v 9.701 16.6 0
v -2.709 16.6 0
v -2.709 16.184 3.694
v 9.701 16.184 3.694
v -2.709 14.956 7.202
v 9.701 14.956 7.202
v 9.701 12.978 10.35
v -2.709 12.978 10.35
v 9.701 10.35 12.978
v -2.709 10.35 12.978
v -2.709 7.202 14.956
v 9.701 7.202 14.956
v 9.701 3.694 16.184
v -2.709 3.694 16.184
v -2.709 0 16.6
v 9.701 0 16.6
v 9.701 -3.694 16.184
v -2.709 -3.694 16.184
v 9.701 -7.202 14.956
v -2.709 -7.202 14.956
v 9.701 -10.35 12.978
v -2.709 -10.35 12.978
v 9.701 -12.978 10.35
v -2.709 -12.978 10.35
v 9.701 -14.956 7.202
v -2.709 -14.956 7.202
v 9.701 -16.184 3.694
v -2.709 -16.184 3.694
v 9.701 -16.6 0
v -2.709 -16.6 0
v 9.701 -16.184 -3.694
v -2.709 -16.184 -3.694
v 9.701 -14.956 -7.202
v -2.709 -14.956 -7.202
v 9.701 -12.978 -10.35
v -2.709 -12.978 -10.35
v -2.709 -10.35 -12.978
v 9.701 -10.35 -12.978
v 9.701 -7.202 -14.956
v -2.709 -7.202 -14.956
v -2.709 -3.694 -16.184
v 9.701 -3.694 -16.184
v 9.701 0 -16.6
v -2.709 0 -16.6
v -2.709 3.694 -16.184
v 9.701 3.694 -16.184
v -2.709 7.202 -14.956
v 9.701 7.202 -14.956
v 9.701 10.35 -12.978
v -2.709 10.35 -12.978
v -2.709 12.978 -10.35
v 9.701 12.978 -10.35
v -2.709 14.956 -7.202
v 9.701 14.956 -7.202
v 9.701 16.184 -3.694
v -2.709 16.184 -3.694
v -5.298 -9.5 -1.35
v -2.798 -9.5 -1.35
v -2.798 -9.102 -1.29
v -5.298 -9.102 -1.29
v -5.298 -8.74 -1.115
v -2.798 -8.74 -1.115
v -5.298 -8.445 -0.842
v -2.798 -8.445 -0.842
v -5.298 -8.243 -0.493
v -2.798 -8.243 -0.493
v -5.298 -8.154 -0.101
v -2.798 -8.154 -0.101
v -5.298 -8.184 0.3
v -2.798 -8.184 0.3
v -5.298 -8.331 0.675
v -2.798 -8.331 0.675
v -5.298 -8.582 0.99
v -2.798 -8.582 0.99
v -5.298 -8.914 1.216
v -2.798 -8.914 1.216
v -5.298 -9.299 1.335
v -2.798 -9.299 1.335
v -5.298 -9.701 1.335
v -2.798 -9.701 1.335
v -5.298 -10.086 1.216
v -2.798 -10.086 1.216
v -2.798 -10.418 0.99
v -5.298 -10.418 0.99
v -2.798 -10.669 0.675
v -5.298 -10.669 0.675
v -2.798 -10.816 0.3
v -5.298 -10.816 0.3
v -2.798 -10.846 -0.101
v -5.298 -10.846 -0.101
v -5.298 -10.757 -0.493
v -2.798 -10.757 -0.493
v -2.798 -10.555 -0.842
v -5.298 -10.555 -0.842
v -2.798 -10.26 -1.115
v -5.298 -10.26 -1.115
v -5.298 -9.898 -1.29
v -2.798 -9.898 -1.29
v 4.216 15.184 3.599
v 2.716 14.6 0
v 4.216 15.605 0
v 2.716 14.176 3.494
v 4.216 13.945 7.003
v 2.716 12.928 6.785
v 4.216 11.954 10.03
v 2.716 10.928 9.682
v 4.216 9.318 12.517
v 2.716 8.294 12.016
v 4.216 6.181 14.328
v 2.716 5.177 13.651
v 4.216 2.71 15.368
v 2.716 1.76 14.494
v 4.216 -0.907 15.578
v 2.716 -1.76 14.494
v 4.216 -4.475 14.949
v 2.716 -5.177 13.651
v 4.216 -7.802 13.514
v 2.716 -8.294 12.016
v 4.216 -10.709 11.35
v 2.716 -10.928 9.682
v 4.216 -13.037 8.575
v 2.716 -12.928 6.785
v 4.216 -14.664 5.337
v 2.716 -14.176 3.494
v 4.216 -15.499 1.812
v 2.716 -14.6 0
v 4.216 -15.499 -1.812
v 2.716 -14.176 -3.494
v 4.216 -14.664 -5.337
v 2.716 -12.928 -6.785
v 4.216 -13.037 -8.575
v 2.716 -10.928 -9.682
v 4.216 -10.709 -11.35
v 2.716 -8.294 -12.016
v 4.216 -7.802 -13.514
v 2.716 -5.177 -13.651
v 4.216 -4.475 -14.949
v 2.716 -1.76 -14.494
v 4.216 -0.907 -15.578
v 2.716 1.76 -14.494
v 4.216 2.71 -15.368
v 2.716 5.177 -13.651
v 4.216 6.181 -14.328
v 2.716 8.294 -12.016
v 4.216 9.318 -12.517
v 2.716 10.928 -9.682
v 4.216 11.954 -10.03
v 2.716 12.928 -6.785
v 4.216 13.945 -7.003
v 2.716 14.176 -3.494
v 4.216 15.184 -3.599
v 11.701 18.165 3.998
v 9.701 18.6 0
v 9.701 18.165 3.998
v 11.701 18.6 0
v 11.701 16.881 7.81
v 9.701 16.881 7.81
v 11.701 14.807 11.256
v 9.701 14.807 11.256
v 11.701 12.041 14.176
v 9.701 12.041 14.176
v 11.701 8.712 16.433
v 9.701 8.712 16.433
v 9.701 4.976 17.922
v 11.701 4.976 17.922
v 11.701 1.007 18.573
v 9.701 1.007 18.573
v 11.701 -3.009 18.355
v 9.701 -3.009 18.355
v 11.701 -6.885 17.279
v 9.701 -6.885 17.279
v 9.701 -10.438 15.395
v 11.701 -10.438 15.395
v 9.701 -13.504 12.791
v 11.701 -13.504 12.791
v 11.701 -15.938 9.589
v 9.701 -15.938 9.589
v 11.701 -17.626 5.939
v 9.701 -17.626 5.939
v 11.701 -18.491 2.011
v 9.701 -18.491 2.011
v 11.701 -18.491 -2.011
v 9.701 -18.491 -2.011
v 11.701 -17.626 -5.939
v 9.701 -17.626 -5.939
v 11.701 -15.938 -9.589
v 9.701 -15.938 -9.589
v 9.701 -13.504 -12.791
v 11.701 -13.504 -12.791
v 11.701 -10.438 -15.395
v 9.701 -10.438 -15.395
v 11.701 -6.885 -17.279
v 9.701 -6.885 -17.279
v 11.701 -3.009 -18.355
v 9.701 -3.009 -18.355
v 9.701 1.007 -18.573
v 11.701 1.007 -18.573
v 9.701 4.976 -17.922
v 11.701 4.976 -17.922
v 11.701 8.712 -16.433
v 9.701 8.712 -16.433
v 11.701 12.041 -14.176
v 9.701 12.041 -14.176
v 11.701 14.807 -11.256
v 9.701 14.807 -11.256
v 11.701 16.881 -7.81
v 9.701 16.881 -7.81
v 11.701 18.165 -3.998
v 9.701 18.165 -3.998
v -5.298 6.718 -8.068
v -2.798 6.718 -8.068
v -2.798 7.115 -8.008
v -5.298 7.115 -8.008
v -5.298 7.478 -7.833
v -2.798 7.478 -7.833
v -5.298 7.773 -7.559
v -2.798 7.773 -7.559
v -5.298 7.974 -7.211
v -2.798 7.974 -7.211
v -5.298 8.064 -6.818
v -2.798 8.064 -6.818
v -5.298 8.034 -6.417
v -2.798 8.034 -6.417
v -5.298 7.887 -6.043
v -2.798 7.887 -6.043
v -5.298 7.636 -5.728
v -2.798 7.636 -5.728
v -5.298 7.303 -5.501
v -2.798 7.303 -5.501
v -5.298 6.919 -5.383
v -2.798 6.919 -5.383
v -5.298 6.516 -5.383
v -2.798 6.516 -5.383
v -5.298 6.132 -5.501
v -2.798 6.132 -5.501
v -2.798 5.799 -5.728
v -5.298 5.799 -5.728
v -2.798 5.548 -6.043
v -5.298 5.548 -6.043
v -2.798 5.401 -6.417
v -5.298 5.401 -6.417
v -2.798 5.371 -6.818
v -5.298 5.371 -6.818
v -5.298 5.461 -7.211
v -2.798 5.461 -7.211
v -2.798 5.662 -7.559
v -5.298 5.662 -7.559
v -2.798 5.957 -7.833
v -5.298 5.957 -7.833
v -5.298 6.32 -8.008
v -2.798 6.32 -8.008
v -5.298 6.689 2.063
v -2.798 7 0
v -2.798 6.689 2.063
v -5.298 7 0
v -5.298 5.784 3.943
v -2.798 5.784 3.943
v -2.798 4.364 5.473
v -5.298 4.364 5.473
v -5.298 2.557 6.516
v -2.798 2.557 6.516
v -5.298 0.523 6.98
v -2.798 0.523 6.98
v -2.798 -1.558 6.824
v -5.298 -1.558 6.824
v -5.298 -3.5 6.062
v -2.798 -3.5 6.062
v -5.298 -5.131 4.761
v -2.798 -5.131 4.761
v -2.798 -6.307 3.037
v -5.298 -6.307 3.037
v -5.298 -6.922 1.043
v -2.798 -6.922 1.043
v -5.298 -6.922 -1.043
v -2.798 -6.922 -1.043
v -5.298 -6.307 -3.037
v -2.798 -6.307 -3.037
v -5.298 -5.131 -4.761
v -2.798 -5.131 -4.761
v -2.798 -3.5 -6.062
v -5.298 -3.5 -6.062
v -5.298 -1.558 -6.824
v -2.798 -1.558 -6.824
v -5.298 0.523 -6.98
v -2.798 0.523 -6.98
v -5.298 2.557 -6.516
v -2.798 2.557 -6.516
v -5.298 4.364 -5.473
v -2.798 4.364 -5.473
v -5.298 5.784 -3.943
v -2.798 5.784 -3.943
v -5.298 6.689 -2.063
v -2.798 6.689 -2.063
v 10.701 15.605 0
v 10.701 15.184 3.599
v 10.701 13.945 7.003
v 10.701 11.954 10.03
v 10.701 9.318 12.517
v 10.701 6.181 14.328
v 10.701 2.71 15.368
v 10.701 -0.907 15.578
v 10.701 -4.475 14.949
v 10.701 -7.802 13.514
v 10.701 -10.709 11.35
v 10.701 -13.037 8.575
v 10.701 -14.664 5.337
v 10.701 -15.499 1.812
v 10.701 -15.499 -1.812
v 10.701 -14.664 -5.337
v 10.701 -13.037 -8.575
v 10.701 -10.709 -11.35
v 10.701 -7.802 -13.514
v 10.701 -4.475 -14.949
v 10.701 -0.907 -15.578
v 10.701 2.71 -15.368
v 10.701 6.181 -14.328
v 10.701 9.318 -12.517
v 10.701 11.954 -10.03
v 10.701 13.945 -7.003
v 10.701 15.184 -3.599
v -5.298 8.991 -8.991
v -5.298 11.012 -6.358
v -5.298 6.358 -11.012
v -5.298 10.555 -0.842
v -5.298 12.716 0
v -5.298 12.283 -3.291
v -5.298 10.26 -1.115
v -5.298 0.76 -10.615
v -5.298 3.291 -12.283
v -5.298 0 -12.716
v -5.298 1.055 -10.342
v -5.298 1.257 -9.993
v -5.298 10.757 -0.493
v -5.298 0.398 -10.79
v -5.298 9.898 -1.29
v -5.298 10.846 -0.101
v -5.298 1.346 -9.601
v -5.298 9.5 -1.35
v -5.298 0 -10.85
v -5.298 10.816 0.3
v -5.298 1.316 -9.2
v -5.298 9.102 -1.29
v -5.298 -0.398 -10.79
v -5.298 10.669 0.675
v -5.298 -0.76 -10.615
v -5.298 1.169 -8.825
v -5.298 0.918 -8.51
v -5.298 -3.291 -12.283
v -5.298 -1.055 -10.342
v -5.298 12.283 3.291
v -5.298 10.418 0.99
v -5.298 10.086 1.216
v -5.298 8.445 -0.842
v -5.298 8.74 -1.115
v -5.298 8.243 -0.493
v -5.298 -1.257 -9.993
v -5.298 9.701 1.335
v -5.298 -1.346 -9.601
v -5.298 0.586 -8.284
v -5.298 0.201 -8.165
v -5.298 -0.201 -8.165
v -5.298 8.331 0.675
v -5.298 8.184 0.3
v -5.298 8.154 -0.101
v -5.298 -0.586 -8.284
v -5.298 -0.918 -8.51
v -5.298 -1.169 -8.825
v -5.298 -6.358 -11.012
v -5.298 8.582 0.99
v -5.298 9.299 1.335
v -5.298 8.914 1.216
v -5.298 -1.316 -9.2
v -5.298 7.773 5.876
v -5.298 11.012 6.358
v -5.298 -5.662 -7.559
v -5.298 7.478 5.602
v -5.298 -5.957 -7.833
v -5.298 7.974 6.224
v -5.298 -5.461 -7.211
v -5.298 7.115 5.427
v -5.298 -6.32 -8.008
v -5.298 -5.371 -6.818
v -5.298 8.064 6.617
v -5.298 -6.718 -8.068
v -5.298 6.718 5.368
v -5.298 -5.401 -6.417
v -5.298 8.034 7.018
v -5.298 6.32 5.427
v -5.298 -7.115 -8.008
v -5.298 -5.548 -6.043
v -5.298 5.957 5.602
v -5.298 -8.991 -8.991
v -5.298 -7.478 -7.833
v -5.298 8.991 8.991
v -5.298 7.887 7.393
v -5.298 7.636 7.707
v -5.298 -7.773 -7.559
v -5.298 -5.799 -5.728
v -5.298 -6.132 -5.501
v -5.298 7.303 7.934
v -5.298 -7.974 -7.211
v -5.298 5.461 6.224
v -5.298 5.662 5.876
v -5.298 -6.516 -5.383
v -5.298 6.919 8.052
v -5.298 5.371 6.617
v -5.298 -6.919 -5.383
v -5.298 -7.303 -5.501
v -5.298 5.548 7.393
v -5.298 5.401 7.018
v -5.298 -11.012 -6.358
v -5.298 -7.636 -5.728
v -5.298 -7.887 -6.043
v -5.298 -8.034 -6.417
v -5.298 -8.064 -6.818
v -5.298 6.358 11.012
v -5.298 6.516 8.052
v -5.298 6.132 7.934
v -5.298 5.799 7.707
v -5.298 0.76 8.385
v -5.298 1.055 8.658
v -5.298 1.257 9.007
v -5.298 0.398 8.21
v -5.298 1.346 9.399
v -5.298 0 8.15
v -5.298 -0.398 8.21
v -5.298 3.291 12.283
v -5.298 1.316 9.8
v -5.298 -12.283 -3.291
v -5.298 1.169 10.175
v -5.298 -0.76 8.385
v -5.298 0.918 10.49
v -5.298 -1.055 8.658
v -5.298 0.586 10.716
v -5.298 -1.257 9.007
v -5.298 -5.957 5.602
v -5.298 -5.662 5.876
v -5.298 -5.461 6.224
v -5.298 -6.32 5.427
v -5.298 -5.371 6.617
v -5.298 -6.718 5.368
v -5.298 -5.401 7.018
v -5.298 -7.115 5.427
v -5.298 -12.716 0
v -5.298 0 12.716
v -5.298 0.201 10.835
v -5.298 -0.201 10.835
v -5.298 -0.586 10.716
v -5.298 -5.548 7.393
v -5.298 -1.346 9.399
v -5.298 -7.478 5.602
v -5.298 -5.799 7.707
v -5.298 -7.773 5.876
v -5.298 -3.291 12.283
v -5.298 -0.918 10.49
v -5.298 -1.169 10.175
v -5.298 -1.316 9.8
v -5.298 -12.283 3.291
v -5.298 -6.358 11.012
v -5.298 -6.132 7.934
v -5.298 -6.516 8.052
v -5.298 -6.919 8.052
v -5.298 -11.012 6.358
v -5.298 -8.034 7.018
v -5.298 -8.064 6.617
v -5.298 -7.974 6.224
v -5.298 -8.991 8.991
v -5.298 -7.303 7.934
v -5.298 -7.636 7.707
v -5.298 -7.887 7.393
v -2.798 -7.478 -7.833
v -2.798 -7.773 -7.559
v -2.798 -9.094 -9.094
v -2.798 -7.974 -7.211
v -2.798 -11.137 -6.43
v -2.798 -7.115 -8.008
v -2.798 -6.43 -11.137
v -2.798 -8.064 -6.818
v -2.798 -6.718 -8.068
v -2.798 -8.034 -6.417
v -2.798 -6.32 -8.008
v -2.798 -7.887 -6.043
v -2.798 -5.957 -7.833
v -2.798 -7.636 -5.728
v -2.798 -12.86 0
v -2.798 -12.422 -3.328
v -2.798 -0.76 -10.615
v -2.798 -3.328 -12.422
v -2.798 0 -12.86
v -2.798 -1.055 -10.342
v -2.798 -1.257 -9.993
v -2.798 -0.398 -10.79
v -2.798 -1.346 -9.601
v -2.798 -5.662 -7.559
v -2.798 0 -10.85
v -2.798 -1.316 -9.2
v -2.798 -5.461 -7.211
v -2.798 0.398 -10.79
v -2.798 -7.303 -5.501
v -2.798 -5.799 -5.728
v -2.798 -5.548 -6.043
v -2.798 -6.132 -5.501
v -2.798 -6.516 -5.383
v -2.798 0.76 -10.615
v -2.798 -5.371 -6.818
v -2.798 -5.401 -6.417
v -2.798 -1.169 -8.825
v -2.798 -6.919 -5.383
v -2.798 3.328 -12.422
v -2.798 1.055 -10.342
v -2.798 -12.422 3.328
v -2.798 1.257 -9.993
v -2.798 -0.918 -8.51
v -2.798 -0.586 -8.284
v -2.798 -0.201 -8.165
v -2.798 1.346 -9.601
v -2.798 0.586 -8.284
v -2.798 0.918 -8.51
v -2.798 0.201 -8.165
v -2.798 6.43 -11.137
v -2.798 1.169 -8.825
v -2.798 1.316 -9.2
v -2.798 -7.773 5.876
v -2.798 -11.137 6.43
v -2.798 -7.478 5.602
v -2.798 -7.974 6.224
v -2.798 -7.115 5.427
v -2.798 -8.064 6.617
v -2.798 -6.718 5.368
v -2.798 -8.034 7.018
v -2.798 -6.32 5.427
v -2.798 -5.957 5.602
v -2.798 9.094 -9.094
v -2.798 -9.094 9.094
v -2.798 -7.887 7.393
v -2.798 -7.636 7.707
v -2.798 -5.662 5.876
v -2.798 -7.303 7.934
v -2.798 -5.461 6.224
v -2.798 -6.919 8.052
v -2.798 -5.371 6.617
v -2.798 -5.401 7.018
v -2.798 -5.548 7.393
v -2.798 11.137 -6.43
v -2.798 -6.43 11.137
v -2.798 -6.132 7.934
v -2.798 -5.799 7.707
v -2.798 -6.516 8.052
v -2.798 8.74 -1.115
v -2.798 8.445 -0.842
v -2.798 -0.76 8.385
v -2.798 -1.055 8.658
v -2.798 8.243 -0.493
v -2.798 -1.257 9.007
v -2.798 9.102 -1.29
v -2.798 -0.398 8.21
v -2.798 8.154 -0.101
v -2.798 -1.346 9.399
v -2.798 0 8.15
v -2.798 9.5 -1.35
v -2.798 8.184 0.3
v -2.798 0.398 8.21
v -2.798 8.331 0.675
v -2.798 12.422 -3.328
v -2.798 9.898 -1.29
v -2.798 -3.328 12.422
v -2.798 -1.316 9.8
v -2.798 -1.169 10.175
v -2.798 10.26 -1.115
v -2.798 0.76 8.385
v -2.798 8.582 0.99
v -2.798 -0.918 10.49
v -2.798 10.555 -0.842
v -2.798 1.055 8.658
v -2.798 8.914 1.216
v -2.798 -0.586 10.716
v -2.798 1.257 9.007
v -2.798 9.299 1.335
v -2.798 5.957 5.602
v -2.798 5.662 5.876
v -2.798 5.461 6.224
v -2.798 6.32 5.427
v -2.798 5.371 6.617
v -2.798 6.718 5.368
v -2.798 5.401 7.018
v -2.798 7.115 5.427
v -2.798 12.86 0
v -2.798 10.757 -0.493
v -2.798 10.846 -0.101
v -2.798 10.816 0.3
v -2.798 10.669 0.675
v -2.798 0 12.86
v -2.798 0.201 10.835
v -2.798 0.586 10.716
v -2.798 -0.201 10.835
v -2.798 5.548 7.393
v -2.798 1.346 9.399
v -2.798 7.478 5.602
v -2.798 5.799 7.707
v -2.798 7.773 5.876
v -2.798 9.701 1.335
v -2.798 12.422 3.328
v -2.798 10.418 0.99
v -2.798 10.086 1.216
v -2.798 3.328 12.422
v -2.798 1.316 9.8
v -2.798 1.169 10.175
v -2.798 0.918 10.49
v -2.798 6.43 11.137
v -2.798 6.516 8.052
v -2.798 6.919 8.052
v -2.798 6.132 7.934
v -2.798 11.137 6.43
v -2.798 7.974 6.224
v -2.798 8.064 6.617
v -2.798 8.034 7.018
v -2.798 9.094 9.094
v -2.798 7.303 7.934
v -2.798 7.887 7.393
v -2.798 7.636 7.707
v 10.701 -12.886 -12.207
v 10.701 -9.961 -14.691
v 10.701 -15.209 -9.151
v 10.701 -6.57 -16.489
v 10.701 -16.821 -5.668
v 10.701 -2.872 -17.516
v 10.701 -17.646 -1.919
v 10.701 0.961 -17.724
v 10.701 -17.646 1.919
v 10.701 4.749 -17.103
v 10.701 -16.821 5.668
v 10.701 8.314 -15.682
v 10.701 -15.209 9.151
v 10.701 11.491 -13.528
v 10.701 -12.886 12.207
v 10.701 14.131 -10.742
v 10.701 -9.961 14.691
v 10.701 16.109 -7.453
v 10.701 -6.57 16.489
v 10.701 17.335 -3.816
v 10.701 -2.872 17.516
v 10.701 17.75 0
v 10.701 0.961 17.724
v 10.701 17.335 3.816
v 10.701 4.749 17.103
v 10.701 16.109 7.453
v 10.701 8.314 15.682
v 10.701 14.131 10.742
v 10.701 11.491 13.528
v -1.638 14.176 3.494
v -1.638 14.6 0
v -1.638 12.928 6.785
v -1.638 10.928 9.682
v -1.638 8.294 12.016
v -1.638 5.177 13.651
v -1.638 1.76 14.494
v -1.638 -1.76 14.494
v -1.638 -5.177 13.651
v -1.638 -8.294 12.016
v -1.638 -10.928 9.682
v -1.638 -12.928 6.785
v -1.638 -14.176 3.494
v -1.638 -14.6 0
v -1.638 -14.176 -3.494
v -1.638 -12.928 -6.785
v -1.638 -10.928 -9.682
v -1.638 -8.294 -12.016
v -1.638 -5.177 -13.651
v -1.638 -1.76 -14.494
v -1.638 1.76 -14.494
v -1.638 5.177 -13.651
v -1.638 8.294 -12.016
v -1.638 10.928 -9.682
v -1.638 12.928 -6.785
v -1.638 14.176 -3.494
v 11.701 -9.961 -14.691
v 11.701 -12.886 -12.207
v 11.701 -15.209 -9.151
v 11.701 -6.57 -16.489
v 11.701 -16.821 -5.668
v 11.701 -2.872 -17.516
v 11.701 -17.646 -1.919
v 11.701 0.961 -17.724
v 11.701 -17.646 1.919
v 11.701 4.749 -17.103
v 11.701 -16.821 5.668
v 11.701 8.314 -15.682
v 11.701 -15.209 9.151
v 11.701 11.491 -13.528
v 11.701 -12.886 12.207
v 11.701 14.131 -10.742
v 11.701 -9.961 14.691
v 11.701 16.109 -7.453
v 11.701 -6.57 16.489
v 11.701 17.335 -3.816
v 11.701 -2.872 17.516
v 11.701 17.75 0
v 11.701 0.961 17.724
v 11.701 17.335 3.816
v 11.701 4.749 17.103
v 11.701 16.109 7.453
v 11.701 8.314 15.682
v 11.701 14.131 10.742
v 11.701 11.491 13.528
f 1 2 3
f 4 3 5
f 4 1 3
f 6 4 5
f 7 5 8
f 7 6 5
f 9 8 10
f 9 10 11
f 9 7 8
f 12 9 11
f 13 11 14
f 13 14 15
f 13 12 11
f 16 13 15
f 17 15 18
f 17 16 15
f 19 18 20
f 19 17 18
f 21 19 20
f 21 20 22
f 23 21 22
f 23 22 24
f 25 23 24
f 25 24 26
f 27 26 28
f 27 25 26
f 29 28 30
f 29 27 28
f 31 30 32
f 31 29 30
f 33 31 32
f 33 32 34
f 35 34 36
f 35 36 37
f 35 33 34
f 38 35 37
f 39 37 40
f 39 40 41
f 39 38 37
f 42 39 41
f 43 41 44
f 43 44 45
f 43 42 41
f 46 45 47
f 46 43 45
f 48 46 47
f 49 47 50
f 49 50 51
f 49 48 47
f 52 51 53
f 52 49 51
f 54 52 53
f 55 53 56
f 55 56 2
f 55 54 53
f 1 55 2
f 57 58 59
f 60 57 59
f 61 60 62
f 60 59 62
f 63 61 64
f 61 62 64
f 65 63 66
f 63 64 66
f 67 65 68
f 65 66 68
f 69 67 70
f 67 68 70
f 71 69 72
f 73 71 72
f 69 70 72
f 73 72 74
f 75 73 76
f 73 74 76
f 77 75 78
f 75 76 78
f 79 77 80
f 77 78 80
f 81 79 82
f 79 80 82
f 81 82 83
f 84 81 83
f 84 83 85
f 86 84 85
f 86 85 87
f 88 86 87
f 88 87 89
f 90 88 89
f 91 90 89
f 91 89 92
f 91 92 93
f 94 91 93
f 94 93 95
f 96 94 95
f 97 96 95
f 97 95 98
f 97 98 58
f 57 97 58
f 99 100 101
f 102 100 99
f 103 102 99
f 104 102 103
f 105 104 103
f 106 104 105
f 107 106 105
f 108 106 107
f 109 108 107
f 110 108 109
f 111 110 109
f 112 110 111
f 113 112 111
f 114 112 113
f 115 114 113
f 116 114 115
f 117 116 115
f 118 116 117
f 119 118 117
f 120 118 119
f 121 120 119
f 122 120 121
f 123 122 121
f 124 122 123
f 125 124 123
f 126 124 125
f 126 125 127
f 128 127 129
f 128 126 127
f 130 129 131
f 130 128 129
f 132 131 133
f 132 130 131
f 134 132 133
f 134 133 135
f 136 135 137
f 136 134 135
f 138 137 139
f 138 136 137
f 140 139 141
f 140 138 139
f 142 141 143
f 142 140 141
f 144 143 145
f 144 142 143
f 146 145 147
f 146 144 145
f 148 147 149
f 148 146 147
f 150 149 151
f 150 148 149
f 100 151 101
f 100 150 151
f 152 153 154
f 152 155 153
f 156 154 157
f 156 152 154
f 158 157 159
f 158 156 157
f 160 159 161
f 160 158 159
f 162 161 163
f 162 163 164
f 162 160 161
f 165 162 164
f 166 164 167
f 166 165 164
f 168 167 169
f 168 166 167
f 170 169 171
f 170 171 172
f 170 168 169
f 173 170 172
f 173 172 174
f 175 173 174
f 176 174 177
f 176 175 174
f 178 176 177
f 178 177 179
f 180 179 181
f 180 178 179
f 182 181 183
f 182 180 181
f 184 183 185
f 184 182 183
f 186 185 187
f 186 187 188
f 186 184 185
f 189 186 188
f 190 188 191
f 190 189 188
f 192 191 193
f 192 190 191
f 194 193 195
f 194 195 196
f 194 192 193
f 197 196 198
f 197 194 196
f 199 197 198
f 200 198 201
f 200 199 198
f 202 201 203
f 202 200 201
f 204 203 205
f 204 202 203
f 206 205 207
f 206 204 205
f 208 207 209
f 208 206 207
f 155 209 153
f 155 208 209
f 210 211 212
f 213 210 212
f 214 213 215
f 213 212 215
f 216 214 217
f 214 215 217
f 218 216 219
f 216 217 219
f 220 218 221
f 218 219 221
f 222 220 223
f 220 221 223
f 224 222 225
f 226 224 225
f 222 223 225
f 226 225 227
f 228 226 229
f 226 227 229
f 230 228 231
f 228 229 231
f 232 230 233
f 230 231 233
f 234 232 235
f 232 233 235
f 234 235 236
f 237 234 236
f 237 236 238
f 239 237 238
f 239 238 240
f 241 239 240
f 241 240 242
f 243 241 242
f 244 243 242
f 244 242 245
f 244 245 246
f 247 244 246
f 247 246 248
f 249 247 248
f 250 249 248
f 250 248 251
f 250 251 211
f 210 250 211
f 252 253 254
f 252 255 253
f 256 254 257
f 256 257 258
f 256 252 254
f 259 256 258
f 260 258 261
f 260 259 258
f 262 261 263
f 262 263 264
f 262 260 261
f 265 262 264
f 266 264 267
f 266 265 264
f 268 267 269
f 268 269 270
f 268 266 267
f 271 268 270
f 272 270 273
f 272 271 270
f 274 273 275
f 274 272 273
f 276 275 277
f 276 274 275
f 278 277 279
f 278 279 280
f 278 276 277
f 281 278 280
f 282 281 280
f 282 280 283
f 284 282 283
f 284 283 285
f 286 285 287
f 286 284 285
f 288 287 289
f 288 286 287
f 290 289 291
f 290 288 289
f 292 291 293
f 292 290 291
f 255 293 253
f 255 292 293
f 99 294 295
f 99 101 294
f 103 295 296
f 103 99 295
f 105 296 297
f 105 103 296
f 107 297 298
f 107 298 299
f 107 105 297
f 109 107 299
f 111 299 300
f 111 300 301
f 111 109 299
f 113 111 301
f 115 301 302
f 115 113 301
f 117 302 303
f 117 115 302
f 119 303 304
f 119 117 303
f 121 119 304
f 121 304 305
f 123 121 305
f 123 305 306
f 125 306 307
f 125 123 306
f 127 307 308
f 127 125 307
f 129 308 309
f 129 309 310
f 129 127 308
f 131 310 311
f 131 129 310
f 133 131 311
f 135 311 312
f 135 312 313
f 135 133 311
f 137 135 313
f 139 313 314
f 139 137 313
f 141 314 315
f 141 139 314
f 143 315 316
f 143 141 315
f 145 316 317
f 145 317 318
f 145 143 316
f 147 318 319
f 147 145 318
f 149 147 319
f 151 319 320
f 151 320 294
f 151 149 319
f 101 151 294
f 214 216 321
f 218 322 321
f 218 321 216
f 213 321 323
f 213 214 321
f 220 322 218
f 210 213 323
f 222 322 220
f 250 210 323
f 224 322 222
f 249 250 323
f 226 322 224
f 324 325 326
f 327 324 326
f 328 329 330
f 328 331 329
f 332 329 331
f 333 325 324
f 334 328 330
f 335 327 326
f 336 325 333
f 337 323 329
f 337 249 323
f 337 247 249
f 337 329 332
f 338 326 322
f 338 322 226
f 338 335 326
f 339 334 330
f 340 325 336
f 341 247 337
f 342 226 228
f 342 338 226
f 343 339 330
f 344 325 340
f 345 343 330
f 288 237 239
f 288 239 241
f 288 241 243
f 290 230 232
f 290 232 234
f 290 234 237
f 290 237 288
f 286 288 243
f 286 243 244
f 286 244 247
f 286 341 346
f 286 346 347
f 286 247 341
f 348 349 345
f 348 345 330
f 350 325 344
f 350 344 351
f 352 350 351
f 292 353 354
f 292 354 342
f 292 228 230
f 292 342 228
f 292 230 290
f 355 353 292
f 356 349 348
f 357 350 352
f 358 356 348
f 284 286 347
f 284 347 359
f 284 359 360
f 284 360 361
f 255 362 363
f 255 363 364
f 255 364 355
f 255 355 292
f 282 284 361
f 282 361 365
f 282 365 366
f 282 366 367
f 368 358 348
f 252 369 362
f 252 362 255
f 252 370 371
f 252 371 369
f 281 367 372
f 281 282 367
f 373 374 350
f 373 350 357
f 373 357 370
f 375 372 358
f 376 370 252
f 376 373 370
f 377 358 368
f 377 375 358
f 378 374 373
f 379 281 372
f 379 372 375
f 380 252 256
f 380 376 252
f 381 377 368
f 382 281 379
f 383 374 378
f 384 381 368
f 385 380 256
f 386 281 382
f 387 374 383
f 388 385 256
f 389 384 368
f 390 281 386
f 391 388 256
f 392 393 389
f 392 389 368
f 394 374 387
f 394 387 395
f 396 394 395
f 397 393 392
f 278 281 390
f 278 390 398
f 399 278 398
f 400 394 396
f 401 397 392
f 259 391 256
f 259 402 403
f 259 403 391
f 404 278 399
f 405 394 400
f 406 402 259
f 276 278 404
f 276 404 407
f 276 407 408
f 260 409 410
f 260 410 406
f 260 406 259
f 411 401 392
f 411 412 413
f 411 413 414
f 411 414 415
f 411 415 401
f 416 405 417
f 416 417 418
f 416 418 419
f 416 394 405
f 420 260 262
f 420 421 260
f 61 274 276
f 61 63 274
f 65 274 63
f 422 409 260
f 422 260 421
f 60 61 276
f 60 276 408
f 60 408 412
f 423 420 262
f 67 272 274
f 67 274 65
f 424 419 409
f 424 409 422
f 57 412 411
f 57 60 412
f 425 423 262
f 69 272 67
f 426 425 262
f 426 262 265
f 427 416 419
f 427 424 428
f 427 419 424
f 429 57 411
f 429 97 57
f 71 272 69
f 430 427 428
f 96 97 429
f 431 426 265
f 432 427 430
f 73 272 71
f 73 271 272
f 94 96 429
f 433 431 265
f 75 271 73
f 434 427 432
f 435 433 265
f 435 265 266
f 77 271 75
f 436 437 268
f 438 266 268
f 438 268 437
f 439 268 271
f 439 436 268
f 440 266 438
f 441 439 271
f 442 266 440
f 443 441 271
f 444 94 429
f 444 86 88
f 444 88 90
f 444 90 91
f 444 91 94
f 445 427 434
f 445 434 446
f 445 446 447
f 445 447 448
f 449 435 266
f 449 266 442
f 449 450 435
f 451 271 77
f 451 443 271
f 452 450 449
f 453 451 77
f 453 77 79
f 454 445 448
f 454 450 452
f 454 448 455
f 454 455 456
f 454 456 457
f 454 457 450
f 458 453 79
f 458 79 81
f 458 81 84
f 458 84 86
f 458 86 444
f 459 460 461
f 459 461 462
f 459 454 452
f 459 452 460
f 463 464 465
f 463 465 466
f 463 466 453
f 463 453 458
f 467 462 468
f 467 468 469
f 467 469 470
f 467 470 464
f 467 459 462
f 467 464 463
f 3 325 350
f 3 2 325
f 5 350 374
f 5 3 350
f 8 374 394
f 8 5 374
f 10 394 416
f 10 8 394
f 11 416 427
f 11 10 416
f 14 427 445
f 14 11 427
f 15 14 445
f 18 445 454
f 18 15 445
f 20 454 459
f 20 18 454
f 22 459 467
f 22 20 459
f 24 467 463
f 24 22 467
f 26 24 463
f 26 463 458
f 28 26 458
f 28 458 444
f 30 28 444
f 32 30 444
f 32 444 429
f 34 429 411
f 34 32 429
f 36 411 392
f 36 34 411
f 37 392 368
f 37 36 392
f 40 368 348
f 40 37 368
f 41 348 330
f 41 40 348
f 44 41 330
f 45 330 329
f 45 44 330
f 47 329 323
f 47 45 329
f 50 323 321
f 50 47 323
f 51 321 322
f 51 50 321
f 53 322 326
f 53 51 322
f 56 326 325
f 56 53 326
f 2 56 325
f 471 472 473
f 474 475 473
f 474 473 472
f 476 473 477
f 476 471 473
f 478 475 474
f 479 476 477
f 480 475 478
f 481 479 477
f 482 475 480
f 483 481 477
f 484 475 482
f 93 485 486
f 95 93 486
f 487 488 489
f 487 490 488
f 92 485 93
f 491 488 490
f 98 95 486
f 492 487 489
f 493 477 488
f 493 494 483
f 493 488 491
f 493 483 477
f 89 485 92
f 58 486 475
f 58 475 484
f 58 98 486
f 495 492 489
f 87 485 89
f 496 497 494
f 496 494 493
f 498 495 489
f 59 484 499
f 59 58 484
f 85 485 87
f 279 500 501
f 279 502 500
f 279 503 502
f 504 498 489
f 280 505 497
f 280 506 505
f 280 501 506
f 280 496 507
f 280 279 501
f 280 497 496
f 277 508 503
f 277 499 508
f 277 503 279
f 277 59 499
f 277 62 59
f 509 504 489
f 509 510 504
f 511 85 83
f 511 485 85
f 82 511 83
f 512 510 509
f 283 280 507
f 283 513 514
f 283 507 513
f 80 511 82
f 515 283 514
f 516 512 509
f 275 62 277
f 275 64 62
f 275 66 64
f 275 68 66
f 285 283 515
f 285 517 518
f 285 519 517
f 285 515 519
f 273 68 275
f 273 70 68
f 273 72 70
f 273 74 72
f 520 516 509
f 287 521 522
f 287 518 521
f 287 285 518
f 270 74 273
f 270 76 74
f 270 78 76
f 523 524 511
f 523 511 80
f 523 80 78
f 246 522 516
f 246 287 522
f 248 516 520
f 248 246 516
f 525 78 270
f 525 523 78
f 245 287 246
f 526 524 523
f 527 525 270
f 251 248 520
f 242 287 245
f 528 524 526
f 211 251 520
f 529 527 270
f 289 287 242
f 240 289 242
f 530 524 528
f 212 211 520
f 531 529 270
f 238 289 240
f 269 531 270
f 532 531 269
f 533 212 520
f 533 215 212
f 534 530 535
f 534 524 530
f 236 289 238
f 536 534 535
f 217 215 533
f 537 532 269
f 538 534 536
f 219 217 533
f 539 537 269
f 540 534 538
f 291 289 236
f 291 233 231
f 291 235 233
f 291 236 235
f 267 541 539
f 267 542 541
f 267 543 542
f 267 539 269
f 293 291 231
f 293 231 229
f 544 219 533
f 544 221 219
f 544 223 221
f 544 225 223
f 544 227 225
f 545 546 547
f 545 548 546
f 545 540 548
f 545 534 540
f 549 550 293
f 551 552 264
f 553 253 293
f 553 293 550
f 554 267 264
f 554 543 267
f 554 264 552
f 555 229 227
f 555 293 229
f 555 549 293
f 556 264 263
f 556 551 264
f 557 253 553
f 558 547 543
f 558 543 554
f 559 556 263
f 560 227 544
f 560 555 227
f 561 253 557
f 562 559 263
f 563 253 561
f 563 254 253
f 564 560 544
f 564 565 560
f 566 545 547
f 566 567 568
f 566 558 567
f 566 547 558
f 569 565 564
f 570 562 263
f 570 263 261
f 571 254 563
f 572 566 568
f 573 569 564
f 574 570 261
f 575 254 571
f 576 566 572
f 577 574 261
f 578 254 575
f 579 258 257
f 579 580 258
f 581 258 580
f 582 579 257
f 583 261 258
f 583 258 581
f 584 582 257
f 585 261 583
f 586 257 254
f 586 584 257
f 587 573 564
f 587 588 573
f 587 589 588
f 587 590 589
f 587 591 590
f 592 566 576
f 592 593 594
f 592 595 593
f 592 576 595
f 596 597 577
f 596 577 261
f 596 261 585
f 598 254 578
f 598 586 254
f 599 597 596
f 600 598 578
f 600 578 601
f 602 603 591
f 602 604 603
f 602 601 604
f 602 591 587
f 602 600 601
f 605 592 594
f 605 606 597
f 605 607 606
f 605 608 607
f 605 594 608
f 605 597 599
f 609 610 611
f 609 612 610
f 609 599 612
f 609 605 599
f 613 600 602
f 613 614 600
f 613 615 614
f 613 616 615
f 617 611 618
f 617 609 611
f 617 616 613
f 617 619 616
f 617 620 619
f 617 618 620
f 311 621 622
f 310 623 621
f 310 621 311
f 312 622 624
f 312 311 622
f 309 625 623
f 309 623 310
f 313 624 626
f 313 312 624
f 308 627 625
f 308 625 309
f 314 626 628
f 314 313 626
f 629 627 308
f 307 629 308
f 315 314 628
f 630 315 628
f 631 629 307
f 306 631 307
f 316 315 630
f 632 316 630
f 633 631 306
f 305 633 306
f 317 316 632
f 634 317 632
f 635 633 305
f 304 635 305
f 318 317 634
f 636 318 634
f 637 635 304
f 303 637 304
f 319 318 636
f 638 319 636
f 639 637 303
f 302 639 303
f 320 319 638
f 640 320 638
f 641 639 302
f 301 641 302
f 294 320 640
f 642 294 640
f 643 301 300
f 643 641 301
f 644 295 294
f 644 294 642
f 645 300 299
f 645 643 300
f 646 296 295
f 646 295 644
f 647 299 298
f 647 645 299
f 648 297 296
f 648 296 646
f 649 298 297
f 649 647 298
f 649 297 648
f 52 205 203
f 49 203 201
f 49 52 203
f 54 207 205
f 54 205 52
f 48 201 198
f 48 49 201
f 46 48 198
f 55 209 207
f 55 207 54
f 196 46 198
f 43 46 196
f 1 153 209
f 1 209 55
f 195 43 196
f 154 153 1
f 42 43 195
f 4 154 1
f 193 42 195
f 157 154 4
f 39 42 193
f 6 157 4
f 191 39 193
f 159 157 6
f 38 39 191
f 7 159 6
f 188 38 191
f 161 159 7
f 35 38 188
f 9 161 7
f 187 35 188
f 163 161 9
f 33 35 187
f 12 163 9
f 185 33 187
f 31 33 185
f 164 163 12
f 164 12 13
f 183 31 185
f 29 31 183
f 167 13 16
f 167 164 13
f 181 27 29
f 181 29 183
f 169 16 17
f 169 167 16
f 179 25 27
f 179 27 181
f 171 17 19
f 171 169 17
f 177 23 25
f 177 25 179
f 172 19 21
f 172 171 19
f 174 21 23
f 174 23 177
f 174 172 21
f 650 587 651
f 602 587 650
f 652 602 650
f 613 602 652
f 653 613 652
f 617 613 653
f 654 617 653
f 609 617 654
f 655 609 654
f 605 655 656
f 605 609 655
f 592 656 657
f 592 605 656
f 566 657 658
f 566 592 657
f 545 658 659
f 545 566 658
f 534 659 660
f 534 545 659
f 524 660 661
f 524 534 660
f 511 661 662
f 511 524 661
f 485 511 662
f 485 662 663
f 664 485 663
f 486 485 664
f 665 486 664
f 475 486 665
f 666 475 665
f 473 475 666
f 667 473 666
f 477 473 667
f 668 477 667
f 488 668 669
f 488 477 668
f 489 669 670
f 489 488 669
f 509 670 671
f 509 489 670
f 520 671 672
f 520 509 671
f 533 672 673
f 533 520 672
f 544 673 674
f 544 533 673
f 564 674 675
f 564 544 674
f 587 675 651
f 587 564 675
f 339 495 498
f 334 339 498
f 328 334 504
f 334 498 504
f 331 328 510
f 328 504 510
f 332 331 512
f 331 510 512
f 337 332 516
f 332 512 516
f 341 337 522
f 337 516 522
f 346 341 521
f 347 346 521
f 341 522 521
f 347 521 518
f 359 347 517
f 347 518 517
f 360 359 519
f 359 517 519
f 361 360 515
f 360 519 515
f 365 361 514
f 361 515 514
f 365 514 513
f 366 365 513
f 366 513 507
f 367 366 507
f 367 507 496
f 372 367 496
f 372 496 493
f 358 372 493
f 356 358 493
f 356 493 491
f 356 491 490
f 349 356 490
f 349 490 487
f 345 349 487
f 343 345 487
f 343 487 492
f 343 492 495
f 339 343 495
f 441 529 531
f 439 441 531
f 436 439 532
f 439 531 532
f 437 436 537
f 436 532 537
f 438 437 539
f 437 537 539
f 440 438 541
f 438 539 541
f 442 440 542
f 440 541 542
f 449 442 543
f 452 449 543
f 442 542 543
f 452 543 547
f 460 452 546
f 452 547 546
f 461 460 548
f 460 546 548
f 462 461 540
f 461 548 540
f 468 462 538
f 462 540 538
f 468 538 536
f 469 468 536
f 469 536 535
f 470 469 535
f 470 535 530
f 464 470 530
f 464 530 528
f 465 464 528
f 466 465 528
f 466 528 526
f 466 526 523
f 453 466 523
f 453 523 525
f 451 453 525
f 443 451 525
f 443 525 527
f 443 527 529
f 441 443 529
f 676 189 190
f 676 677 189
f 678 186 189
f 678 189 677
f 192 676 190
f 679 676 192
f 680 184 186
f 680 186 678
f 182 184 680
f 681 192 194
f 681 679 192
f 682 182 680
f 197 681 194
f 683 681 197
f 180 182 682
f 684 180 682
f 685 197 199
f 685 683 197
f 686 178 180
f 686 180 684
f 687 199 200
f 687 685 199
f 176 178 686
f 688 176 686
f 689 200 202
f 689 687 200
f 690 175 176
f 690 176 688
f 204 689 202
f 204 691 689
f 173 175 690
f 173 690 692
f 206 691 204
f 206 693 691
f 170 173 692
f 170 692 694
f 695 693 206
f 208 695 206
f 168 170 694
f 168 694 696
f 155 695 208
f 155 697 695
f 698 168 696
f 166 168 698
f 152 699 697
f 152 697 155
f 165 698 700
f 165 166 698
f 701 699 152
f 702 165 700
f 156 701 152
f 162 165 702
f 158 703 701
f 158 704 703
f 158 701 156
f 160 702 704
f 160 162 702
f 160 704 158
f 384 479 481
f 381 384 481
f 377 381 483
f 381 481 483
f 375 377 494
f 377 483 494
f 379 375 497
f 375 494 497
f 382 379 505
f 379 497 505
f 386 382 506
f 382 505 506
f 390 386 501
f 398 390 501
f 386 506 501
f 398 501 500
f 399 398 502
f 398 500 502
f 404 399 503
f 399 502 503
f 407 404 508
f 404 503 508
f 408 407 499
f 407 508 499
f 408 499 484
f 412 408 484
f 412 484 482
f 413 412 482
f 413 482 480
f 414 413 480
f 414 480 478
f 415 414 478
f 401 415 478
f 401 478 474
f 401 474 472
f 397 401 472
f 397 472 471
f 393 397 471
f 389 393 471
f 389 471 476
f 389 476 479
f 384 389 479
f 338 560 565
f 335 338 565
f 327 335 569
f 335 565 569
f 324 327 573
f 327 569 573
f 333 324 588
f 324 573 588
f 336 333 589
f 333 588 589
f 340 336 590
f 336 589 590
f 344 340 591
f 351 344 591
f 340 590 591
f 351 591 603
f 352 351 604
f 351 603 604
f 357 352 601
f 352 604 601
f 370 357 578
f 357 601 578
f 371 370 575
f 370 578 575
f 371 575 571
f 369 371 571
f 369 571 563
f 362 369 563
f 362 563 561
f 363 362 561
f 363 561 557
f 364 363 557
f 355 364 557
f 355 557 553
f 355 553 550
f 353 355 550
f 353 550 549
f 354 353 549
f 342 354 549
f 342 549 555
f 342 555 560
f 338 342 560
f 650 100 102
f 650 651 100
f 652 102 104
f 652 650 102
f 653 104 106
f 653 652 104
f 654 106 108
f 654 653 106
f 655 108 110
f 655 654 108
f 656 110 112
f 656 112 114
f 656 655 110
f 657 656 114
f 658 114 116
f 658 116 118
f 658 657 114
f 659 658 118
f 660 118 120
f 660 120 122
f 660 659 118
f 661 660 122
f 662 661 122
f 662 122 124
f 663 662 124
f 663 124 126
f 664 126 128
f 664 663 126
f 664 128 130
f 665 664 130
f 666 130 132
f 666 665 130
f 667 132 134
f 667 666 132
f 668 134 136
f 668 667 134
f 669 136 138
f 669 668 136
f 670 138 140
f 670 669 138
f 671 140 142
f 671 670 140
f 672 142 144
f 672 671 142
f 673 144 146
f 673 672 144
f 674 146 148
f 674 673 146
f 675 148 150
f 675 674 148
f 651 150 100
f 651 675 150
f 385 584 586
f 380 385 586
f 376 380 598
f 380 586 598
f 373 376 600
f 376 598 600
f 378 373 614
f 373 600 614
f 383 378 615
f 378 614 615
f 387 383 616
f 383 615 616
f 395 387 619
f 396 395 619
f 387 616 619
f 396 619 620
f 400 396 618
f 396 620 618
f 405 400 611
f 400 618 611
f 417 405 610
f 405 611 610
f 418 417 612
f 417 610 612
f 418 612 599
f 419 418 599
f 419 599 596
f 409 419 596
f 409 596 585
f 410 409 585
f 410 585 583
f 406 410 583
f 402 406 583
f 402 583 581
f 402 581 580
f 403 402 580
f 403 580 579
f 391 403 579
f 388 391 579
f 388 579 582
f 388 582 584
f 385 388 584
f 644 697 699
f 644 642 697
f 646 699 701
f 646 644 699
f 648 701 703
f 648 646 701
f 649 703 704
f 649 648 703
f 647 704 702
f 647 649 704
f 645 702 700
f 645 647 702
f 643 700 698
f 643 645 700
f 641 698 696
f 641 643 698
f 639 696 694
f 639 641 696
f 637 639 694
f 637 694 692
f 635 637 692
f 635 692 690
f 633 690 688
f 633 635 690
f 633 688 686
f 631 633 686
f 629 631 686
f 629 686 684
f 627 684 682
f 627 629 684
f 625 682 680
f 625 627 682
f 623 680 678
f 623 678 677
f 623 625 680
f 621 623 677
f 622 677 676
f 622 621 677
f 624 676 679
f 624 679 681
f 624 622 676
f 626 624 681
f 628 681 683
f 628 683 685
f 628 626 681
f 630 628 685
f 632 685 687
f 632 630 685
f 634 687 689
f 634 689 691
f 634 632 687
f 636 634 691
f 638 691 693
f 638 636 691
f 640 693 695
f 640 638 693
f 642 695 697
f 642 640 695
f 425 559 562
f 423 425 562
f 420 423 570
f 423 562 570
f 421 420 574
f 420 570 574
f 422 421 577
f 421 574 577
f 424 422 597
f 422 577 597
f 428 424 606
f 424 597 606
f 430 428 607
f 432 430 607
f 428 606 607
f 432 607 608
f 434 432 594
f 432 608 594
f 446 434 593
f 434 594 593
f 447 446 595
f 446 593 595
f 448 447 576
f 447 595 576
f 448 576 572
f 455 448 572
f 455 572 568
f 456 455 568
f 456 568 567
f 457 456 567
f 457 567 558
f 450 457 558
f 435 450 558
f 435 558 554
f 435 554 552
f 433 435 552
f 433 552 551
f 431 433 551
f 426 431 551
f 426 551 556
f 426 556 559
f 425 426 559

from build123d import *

# Parameters (mm, degrees)
SKETCH2_R          = 1.35
CUT_EXTRUDE1_DEPTH = 10


with BuildPart() as part:
    # Sketch1 → Revolve1 (revolve)
    with BuildSketch(Plane.XY):
        Polygon((-5.298096504, 7), (-5.298096504, 12.715801809), (-2.708631043, 16.6), (9.701368957, 16.6), (9.701368957, 18.6), (11.701368957, 18.6), (11.701368957, 17.75), (10.701368957, 17.75), (10.701368957, 15.604601484), (4.215618846, 15.604601484), (2.715618846, 14.6), (-1.638263526, 14.6), (-2.798096504, 12.860250534), (-2.798096504, 7), align=None)
    revolve(axis=Axis((-25, 0, 0), (1, 0, 0)))

    # Sketch2 → Cut-Extrude1 (cut)
    with BuildSketch(Plane(origin=(-2.798096504, 0, 0), x_dir=(0, 0, -1), z_dir=(1, 0, 0))):
        with Locations((0, 9.5)):
            Circle(SKETCH2_R)
        with Locations((6.717514421, 6.717514421)):
            Circle(SKETCH2_R)
        with Locations((9.5, 0)):
            Circle(SKETCH2_R)
        with Locations((6.717514421, -6.717514421)):
            Circle(SKETCH2_R)
        with Locations((0, -9.5)):
            Circle(SKETCH2_R)
        with Locations((-6.717514421, -6.717514421)):
            Circle(SKETCH2_R)
        with Locations((-9.5, 0)):
            Circle(SKETCH2_R)
        with Locations((-6.717514421, 6.717514421)):
            Circle(SKETCH2_R)
    extrude(amount=-CUT_EXTRUDE1_DEPTH, mode=Mode.SUBTRACT)


solid = part.part
